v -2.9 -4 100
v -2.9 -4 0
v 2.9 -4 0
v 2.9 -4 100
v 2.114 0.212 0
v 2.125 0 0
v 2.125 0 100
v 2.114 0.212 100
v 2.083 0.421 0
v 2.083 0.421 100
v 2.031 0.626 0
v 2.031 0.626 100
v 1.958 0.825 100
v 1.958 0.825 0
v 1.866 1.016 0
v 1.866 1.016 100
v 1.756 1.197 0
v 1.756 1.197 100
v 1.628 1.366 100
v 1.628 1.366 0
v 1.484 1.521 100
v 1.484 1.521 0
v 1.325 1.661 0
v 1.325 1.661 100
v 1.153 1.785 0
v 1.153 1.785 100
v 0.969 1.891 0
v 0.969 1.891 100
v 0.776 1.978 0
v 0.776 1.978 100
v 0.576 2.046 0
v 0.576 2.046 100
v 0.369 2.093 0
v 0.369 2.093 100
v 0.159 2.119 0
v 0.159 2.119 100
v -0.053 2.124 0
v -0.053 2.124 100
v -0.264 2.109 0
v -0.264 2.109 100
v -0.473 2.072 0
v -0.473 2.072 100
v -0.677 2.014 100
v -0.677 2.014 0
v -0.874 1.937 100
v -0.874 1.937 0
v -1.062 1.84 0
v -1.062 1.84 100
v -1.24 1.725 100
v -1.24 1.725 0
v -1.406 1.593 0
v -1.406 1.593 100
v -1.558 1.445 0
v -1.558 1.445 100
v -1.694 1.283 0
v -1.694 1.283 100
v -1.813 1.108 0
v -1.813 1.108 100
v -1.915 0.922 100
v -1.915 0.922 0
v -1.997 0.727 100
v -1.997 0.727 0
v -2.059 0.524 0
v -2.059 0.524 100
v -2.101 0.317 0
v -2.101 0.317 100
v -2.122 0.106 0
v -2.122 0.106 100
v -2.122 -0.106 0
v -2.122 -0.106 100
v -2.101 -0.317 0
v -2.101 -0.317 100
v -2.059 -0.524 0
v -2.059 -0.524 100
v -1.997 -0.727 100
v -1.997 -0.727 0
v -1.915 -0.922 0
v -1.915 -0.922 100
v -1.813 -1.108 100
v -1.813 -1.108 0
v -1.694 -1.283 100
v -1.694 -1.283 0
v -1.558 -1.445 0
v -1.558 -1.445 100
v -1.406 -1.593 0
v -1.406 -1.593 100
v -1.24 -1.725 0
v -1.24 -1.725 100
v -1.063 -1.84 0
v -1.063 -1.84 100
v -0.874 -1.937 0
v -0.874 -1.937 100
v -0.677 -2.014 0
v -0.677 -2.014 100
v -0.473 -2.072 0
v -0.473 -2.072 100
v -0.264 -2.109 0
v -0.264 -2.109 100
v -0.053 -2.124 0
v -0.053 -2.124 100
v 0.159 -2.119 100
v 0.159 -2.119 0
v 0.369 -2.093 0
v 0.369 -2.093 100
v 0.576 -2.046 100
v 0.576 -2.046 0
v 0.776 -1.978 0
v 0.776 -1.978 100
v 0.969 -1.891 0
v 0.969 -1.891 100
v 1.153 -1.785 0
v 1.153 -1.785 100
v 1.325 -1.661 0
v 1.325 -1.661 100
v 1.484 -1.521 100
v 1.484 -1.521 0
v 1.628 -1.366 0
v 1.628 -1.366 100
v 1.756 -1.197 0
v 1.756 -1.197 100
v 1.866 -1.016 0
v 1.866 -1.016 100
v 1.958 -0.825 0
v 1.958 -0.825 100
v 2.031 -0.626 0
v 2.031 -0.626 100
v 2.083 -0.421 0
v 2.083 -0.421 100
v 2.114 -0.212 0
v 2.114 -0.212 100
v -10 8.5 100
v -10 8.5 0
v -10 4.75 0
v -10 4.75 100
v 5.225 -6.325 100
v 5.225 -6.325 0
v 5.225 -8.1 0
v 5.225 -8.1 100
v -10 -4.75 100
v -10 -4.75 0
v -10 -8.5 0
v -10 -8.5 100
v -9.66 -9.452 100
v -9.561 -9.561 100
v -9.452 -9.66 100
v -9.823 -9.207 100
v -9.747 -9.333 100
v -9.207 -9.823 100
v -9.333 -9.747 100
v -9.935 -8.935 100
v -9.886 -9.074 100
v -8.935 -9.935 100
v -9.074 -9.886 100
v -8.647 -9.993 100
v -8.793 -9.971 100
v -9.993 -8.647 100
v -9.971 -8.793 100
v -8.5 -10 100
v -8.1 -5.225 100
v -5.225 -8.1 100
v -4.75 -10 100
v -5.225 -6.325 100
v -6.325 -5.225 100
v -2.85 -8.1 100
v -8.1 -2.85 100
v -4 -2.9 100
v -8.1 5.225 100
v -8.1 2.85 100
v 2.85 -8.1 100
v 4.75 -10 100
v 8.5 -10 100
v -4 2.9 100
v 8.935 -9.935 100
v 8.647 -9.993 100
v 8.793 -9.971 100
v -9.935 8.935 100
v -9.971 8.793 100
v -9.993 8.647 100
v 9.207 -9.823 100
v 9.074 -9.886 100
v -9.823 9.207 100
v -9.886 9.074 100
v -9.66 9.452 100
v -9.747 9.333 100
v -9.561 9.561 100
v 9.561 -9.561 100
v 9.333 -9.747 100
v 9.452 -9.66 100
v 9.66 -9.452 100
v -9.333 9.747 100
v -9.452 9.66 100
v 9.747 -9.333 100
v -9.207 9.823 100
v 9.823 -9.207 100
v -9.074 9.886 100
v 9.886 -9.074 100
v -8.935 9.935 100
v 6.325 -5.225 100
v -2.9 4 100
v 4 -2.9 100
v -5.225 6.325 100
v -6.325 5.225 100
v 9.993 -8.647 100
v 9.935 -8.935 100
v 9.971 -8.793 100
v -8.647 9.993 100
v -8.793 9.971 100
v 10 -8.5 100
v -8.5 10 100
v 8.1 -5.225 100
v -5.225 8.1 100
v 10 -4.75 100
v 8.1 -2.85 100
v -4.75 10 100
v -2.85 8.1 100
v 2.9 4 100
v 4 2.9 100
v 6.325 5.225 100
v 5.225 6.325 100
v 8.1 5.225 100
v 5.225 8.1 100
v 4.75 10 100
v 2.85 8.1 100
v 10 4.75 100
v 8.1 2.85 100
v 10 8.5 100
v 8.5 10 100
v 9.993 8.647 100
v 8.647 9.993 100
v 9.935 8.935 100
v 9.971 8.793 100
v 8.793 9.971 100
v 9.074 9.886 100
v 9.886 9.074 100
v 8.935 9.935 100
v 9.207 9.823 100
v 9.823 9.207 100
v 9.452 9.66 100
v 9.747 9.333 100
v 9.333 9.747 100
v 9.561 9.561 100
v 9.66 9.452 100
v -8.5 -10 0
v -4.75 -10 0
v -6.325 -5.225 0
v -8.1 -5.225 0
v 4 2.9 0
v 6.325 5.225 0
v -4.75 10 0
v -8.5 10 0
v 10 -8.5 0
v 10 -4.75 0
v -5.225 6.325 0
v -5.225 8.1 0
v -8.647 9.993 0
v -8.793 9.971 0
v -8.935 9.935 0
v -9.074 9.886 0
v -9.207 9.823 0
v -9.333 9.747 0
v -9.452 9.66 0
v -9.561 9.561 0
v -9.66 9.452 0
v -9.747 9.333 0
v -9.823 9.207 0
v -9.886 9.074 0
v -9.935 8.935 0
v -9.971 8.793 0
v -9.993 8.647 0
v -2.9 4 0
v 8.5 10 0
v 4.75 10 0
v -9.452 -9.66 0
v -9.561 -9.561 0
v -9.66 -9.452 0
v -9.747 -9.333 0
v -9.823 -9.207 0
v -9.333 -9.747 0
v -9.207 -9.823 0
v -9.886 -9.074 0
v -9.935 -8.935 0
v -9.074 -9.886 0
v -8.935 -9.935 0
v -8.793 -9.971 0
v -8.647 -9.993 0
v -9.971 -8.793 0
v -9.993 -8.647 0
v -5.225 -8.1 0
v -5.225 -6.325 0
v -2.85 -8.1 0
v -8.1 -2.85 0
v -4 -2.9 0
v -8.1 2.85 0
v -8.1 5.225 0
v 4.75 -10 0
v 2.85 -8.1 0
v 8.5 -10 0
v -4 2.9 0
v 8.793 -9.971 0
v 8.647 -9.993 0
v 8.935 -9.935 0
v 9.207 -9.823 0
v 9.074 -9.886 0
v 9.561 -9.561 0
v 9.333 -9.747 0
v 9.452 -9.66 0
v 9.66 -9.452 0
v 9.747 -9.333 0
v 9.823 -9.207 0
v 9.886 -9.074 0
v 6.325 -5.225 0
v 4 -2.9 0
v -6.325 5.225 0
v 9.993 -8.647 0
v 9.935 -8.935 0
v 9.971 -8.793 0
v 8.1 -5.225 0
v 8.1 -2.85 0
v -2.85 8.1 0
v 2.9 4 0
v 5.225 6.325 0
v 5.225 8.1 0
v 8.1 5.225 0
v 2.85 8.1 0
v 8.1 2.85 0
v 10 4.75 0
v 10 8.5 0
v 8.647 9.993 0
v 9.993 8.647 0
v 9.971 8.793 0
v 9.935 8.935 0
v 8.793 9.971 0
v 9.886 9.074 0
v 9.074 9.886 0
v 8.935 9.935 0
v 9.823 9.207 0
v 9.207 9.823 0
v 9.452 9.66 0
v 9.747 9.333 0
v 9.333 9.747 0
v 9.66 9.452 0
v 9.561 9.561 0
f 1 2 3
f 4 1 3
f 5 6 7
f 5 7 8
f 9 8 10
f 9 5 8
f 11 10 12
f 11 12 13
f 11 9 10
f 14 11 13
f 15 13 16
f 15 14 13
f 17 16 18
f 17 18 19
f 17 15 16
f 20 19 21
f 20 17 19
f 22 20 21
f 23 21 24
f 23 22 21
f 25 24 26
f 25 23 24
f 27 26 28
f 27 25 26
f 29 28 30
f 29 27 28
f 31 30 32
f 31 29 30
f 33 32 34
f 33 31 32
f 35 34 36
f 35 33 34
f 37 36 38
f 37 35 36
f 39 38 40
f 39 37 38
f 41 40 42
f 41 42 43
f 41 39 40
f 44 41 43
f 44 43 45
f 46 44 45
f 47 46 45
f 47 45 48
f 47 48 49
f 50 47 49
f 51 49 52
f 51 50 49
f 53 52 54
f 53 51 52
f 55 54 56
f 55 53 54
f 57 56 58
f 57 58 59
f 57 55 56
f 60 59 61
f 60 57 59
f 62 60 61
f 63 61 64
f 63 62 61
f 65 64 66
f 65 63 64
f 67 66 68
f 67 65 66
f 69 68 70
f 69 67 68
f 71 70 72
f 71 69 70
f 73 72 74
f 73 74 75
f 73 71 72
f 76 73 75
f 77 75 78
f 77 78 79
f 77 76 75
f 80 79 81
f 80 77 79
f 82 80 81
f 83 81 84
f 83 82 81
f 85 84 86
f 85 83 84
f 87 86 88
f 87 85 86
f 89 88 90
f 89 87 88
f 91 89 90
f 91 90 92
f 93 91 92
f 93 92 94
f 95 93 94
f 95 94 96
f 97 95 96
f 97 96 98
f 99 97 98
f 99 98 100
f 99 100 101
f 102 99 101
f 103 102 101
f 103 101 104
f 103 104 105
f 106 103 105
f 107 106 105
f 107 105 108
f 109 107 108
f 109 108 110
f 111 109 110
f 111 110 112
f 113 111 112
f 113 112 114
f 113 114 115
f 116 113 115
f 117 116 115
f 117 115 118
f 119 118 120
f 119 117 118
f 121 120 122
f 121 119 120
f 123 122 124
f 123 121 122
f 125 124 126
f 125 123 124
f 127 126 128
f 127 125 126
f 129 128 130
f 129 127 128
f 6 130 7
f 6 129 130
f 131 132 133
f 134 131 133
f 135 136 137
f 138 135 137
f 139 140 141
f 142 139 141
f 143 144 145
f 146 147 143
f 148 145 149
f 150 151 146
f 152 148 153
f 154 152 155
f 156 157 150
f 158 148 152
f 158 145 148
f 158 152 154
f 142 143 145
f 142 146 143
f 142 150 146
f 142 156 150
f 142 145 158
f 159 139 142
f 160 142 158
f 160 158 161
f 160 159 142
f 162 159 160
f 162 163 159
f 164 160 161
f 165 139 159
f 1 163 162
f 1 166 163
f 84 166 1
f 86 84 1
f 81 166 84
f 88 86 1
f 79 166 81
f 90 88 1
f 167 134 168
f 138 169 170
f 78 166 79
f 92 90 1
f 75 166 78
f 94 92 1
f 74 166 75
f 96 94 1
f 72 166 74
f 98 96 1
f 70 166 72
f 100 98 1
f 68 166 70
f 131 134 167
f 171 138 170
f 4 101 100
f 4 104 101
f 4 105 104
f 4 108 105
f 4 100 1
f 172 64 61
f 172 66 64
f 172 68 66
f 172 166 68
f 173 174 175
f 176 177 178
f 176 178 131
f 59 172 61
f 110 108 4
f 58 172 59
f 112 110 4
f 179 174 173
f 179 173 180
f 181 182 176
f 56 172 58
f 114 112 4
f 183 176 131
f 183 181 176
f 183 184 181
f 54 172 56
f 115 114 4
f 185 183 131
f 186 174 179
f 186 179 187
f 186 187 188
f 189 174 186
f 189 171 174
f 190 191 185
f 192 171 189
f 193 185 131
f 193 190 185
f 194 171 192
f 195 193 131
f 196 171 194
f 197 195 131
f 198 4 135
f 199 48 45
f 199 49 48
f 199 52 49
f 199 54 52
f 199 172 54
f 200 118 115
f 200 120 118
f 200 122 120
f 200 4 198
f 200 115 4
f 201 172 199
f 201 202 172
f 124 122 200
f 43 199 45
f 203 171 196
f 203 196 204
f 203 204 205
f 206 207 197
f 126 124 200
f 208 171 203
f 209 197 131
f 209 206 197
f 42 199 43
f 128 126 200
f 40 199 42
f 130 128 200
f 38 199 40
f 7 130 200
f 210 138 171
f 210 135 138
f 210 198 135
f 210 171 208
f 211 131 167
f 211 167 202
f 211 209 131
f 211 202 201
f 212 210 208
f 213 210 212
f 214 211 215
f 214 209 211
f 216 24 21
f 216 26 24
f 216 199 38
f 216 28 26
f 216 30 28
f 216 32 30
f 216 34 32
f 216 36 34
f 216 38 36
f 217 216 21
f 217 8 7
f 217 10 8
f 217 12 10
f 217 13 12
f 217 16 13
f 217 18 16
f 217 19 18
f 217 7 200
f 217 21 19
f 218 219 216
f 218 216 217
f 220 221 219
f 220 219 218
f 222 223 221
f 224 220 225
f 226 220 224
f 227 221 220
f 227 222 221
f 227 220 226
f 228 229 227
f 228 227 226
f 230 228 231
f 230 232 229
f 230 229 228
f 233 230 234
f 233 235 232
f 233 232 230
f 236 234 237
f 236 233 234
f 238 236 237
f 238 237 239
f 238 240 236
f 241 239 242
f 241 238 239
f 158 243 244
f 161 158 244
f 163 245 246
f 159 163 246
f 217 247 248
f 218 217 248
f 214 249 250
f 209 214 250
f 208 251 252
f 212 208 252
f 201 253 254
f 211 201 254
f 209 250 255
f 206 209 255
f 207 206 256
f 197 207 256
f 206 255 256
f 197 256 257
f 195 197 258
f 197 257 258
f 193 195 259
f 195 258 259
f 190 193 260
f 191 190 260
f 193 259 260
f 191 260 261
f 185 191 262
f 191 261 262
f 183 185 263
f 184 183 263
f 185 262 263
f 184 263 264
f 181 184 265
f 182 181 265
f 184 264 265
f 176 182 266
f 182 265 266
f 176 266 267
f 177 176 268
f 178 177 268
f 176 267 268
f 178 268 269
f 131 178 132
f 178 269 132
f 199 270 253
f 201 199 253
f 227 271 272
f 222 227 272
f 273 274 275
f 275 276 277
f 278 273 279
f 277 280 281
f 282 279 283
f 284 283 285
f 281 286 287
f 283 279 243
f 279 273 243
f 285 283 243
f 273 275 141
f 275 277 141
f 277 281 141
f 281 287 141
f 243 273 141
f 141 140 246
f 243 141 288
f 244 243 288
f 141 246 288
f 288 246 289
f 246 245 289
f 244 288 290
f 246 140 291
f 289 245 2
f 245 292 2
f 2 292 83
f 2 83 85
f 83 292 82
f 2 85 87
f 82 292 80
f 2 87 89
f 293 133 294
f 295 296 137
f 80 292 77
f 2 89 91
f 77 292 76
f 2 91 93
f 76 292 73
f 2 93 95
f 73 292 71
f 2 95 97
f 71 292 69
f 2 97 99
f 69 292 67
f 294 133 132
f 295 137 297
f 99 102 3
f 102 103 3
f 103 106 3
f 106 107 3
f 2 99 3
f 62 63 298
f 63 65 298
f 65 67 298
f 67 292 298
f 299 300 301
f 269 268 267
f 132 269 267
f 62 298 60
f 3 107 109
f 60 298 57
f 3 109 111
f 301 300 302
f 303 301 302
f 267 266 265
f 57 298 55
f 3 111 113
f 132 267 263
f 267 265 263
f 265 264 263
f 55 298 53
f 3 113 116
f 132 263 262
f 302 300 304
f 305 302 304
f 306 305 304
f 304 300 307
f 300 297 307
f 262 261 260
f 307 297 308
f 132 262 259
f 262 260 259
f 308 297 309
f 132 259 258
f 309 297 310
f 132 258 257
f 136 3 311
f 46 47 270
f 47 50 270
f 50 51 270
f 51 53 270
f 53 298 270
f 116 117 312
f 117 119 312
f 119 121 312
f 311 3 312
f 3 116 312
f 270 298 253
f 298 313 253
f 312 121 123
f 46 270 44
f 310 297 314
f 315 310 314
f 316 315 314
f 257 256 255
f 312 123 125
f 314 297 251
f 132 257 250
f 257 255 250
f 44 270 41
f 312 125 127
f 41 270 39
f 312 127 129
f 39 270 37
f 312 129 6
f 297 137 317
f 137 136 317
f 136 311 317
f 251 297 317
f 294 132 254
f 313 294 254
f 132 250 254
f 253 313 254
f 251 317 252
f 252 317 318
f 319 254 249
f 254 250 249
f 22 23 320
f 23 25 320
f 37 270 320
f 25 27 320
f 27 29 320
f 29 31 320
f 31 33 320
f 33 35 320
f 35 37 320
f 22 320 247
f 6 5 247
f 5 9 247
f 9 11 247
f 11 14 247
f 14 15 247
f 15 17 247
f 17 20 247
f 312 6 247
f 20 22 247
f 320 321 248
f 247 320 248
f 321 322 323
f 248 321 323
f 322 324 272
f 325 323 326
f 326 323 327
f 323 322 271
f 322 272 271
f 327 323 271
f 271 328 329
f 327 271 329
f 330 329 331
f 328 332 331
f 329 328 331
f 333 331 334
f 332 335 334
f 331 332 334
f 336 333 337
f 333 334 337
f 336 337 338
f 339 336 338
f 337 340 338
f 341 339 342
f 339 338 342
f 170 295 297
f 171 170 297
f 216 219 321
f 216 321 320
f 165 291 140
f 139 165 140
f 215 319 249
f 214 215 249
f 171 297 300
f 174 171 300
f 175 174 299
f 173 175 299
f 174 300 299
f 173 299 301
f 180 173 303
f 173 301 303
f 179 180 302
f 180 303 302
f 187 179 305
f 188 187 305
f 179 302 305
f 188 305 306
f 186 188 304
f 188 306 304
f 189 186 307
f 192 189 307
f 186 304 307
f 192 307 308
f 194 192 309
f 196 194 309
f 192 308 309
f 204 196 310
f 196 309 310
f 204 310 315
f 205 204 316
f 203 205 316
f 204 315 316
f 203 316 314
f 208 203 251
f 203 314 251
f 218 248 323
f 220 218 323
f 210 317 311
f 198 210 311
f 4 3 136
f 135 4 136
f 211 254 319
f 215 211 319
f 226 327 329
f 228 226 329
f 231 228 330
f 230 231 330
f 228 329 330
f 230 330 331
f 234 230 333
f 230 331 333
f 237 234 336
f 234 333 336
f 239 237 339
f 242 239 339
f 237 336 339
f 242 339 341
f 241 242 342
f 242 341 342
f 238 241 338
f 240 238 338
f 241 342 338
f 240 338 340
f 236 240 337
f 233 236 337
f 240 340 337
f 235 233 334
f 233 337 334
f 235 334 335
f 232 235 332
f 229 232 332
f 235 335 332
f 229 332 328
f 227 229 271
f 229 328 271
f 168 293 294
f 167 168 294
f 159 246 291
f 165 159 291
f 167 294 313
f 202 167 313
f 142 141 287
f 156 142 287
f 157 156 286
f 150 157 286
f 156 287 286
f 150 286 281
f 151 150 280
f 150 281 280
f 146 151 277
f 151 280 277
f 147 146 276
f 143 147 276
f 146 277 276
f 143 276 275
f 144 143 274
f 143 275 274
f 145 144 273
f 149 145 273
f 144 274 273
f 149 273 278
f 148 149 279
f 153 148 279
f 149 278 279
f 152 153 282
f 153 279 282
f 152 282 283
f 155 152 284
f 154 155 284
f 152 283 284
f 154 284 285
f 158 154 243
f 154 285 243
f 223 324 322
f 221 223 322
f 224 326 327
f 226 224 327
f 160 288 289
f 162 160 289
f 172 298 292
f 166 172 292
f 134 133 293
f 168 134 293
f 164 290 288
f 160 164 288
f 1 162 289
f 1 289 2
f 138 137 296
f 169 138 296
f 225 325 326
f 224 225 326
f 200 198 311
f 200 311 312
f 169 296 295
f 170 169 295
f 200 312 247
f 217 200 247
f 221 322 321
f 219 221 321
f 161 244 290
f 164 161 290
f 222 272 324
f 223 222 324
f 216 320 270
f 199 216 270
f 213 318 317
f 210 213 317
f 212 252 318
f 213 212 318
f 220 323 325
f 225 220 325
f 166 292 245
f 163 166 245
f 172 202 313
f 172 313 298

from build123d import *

# Parameters (mm, degrees)
SKETCH1_R           = 2.125
BOSS_EXTRUDE1_DEPTH = 100


with BuildPart() as part:
    # Sketch1 → Boss-Extrude1 (new body)
    with BuildSketch(Plane.XY):
        with BuildLine():
            Line((8.1, 5.225), (8.1, 2.85))
            Line((8.1, 2.85), (10, 4.75))
            Line((10, 4.75), (10, 8.5))
            ThreePointArc((10, 8.5), (9.560660172, 9.560660172), (8.5, 10))
            Line((8.5, 10), (4.75, 10))
            Line((4.75, 10), (2.85, 8.1))
            Line((2.85, 8.1), (5.225, 8.1))
            Line((5.225, 8.1), (5.225, 6.325))
            Line((5.225, 6.325), (2.9, 4))
            Line((2.9, 4), (-2.9, 4))
            Line((-2.9, 4), (-5.225, 6.325))
            Line((-5.225, 6.325), (-5.225, 8.1))
            Line((-5.225, 8.1), (-2.85, 8.1))
            Line((-2.85, 8.1), (-4.75, 10))
            Line((-4.75, 10), (-8.5, 10))
            ThreePointArc((-8.5, 10), (-9.560660172, 9.560660172), (-10, 8.5))
            Line((-10, 8.5), (-10, 4.75))
            Line((-10, 4.75), (-8.1, 2.85))
            Line((-8.1, 2.85), (-8.1, 5.225))
            Line((-8.1, 5.225), (-6.325, 5.225))
            Line((-6.325, 5.225), (-4, 2.9))
            Line((-4, 2.9), (-4, -2.9))
            Line((-4, -2.9), (-6.325, -5.225))
            Line((-6.325, -5.225), (-8.1, -5.225))
            Line((-8.1, -5.225), (-8.1, -2.85))
            Line((-8.1, -2.85), (-10, -4.75))
            Line((-10, -4.75), (-10, -8.5))
            ThreePointArc((-10, -8.5), (-9.560660172, -9.560660172), (-8.5, -10))
            Line((-8.5, -10), (-4.75, -10))
            Line((-4.75, -10), (-2.85, -8.1))
            Line((-2.85, -8.1), (-5.225, -8.1))
            Line((-5.225, -8.1), (-5.225, -6.325))
            Line((-5.225, -6.325), (-2.9, -4))
            Line((-2.9, -4), (2.9, -4))
            Line((2.9, -4), (5.225, -6.325))
            Line((5.225, -6.325), (5.225, -8.1))
            Line((5.225, -8.1), (2.85, -8.1))
            Line((2.85, -8.1), (4.75, -10))
            Line((4.75, -10), (8.5, -10))
            ThreePointArc((8.5, -10), (9.560660172, -9.560660172), (10, -8.5))
            Line((10, -8.5), (10, -4.75))
            Line((10, -4.75), (8.1, -2.85))
            Line((8.1, -2.85), (8.1, -5.225))
            Line((8.1, -5.225), (6.325, -5.225))
            Line((6.325, -5.225), (4, -2.9))
            Line((4, -2.9), (4, 2.9))
            Line((4, 2.9), (6.325, 5.225))
            Line((6.325, 5.225), (8.1, 5.225))
        make_face()
        Circle(SKETCH1_R, mode=Mode.SUBTRACT)
    extrude(amount=BOSS_EXTRUDE1_DEPTH)


solid = part.part
